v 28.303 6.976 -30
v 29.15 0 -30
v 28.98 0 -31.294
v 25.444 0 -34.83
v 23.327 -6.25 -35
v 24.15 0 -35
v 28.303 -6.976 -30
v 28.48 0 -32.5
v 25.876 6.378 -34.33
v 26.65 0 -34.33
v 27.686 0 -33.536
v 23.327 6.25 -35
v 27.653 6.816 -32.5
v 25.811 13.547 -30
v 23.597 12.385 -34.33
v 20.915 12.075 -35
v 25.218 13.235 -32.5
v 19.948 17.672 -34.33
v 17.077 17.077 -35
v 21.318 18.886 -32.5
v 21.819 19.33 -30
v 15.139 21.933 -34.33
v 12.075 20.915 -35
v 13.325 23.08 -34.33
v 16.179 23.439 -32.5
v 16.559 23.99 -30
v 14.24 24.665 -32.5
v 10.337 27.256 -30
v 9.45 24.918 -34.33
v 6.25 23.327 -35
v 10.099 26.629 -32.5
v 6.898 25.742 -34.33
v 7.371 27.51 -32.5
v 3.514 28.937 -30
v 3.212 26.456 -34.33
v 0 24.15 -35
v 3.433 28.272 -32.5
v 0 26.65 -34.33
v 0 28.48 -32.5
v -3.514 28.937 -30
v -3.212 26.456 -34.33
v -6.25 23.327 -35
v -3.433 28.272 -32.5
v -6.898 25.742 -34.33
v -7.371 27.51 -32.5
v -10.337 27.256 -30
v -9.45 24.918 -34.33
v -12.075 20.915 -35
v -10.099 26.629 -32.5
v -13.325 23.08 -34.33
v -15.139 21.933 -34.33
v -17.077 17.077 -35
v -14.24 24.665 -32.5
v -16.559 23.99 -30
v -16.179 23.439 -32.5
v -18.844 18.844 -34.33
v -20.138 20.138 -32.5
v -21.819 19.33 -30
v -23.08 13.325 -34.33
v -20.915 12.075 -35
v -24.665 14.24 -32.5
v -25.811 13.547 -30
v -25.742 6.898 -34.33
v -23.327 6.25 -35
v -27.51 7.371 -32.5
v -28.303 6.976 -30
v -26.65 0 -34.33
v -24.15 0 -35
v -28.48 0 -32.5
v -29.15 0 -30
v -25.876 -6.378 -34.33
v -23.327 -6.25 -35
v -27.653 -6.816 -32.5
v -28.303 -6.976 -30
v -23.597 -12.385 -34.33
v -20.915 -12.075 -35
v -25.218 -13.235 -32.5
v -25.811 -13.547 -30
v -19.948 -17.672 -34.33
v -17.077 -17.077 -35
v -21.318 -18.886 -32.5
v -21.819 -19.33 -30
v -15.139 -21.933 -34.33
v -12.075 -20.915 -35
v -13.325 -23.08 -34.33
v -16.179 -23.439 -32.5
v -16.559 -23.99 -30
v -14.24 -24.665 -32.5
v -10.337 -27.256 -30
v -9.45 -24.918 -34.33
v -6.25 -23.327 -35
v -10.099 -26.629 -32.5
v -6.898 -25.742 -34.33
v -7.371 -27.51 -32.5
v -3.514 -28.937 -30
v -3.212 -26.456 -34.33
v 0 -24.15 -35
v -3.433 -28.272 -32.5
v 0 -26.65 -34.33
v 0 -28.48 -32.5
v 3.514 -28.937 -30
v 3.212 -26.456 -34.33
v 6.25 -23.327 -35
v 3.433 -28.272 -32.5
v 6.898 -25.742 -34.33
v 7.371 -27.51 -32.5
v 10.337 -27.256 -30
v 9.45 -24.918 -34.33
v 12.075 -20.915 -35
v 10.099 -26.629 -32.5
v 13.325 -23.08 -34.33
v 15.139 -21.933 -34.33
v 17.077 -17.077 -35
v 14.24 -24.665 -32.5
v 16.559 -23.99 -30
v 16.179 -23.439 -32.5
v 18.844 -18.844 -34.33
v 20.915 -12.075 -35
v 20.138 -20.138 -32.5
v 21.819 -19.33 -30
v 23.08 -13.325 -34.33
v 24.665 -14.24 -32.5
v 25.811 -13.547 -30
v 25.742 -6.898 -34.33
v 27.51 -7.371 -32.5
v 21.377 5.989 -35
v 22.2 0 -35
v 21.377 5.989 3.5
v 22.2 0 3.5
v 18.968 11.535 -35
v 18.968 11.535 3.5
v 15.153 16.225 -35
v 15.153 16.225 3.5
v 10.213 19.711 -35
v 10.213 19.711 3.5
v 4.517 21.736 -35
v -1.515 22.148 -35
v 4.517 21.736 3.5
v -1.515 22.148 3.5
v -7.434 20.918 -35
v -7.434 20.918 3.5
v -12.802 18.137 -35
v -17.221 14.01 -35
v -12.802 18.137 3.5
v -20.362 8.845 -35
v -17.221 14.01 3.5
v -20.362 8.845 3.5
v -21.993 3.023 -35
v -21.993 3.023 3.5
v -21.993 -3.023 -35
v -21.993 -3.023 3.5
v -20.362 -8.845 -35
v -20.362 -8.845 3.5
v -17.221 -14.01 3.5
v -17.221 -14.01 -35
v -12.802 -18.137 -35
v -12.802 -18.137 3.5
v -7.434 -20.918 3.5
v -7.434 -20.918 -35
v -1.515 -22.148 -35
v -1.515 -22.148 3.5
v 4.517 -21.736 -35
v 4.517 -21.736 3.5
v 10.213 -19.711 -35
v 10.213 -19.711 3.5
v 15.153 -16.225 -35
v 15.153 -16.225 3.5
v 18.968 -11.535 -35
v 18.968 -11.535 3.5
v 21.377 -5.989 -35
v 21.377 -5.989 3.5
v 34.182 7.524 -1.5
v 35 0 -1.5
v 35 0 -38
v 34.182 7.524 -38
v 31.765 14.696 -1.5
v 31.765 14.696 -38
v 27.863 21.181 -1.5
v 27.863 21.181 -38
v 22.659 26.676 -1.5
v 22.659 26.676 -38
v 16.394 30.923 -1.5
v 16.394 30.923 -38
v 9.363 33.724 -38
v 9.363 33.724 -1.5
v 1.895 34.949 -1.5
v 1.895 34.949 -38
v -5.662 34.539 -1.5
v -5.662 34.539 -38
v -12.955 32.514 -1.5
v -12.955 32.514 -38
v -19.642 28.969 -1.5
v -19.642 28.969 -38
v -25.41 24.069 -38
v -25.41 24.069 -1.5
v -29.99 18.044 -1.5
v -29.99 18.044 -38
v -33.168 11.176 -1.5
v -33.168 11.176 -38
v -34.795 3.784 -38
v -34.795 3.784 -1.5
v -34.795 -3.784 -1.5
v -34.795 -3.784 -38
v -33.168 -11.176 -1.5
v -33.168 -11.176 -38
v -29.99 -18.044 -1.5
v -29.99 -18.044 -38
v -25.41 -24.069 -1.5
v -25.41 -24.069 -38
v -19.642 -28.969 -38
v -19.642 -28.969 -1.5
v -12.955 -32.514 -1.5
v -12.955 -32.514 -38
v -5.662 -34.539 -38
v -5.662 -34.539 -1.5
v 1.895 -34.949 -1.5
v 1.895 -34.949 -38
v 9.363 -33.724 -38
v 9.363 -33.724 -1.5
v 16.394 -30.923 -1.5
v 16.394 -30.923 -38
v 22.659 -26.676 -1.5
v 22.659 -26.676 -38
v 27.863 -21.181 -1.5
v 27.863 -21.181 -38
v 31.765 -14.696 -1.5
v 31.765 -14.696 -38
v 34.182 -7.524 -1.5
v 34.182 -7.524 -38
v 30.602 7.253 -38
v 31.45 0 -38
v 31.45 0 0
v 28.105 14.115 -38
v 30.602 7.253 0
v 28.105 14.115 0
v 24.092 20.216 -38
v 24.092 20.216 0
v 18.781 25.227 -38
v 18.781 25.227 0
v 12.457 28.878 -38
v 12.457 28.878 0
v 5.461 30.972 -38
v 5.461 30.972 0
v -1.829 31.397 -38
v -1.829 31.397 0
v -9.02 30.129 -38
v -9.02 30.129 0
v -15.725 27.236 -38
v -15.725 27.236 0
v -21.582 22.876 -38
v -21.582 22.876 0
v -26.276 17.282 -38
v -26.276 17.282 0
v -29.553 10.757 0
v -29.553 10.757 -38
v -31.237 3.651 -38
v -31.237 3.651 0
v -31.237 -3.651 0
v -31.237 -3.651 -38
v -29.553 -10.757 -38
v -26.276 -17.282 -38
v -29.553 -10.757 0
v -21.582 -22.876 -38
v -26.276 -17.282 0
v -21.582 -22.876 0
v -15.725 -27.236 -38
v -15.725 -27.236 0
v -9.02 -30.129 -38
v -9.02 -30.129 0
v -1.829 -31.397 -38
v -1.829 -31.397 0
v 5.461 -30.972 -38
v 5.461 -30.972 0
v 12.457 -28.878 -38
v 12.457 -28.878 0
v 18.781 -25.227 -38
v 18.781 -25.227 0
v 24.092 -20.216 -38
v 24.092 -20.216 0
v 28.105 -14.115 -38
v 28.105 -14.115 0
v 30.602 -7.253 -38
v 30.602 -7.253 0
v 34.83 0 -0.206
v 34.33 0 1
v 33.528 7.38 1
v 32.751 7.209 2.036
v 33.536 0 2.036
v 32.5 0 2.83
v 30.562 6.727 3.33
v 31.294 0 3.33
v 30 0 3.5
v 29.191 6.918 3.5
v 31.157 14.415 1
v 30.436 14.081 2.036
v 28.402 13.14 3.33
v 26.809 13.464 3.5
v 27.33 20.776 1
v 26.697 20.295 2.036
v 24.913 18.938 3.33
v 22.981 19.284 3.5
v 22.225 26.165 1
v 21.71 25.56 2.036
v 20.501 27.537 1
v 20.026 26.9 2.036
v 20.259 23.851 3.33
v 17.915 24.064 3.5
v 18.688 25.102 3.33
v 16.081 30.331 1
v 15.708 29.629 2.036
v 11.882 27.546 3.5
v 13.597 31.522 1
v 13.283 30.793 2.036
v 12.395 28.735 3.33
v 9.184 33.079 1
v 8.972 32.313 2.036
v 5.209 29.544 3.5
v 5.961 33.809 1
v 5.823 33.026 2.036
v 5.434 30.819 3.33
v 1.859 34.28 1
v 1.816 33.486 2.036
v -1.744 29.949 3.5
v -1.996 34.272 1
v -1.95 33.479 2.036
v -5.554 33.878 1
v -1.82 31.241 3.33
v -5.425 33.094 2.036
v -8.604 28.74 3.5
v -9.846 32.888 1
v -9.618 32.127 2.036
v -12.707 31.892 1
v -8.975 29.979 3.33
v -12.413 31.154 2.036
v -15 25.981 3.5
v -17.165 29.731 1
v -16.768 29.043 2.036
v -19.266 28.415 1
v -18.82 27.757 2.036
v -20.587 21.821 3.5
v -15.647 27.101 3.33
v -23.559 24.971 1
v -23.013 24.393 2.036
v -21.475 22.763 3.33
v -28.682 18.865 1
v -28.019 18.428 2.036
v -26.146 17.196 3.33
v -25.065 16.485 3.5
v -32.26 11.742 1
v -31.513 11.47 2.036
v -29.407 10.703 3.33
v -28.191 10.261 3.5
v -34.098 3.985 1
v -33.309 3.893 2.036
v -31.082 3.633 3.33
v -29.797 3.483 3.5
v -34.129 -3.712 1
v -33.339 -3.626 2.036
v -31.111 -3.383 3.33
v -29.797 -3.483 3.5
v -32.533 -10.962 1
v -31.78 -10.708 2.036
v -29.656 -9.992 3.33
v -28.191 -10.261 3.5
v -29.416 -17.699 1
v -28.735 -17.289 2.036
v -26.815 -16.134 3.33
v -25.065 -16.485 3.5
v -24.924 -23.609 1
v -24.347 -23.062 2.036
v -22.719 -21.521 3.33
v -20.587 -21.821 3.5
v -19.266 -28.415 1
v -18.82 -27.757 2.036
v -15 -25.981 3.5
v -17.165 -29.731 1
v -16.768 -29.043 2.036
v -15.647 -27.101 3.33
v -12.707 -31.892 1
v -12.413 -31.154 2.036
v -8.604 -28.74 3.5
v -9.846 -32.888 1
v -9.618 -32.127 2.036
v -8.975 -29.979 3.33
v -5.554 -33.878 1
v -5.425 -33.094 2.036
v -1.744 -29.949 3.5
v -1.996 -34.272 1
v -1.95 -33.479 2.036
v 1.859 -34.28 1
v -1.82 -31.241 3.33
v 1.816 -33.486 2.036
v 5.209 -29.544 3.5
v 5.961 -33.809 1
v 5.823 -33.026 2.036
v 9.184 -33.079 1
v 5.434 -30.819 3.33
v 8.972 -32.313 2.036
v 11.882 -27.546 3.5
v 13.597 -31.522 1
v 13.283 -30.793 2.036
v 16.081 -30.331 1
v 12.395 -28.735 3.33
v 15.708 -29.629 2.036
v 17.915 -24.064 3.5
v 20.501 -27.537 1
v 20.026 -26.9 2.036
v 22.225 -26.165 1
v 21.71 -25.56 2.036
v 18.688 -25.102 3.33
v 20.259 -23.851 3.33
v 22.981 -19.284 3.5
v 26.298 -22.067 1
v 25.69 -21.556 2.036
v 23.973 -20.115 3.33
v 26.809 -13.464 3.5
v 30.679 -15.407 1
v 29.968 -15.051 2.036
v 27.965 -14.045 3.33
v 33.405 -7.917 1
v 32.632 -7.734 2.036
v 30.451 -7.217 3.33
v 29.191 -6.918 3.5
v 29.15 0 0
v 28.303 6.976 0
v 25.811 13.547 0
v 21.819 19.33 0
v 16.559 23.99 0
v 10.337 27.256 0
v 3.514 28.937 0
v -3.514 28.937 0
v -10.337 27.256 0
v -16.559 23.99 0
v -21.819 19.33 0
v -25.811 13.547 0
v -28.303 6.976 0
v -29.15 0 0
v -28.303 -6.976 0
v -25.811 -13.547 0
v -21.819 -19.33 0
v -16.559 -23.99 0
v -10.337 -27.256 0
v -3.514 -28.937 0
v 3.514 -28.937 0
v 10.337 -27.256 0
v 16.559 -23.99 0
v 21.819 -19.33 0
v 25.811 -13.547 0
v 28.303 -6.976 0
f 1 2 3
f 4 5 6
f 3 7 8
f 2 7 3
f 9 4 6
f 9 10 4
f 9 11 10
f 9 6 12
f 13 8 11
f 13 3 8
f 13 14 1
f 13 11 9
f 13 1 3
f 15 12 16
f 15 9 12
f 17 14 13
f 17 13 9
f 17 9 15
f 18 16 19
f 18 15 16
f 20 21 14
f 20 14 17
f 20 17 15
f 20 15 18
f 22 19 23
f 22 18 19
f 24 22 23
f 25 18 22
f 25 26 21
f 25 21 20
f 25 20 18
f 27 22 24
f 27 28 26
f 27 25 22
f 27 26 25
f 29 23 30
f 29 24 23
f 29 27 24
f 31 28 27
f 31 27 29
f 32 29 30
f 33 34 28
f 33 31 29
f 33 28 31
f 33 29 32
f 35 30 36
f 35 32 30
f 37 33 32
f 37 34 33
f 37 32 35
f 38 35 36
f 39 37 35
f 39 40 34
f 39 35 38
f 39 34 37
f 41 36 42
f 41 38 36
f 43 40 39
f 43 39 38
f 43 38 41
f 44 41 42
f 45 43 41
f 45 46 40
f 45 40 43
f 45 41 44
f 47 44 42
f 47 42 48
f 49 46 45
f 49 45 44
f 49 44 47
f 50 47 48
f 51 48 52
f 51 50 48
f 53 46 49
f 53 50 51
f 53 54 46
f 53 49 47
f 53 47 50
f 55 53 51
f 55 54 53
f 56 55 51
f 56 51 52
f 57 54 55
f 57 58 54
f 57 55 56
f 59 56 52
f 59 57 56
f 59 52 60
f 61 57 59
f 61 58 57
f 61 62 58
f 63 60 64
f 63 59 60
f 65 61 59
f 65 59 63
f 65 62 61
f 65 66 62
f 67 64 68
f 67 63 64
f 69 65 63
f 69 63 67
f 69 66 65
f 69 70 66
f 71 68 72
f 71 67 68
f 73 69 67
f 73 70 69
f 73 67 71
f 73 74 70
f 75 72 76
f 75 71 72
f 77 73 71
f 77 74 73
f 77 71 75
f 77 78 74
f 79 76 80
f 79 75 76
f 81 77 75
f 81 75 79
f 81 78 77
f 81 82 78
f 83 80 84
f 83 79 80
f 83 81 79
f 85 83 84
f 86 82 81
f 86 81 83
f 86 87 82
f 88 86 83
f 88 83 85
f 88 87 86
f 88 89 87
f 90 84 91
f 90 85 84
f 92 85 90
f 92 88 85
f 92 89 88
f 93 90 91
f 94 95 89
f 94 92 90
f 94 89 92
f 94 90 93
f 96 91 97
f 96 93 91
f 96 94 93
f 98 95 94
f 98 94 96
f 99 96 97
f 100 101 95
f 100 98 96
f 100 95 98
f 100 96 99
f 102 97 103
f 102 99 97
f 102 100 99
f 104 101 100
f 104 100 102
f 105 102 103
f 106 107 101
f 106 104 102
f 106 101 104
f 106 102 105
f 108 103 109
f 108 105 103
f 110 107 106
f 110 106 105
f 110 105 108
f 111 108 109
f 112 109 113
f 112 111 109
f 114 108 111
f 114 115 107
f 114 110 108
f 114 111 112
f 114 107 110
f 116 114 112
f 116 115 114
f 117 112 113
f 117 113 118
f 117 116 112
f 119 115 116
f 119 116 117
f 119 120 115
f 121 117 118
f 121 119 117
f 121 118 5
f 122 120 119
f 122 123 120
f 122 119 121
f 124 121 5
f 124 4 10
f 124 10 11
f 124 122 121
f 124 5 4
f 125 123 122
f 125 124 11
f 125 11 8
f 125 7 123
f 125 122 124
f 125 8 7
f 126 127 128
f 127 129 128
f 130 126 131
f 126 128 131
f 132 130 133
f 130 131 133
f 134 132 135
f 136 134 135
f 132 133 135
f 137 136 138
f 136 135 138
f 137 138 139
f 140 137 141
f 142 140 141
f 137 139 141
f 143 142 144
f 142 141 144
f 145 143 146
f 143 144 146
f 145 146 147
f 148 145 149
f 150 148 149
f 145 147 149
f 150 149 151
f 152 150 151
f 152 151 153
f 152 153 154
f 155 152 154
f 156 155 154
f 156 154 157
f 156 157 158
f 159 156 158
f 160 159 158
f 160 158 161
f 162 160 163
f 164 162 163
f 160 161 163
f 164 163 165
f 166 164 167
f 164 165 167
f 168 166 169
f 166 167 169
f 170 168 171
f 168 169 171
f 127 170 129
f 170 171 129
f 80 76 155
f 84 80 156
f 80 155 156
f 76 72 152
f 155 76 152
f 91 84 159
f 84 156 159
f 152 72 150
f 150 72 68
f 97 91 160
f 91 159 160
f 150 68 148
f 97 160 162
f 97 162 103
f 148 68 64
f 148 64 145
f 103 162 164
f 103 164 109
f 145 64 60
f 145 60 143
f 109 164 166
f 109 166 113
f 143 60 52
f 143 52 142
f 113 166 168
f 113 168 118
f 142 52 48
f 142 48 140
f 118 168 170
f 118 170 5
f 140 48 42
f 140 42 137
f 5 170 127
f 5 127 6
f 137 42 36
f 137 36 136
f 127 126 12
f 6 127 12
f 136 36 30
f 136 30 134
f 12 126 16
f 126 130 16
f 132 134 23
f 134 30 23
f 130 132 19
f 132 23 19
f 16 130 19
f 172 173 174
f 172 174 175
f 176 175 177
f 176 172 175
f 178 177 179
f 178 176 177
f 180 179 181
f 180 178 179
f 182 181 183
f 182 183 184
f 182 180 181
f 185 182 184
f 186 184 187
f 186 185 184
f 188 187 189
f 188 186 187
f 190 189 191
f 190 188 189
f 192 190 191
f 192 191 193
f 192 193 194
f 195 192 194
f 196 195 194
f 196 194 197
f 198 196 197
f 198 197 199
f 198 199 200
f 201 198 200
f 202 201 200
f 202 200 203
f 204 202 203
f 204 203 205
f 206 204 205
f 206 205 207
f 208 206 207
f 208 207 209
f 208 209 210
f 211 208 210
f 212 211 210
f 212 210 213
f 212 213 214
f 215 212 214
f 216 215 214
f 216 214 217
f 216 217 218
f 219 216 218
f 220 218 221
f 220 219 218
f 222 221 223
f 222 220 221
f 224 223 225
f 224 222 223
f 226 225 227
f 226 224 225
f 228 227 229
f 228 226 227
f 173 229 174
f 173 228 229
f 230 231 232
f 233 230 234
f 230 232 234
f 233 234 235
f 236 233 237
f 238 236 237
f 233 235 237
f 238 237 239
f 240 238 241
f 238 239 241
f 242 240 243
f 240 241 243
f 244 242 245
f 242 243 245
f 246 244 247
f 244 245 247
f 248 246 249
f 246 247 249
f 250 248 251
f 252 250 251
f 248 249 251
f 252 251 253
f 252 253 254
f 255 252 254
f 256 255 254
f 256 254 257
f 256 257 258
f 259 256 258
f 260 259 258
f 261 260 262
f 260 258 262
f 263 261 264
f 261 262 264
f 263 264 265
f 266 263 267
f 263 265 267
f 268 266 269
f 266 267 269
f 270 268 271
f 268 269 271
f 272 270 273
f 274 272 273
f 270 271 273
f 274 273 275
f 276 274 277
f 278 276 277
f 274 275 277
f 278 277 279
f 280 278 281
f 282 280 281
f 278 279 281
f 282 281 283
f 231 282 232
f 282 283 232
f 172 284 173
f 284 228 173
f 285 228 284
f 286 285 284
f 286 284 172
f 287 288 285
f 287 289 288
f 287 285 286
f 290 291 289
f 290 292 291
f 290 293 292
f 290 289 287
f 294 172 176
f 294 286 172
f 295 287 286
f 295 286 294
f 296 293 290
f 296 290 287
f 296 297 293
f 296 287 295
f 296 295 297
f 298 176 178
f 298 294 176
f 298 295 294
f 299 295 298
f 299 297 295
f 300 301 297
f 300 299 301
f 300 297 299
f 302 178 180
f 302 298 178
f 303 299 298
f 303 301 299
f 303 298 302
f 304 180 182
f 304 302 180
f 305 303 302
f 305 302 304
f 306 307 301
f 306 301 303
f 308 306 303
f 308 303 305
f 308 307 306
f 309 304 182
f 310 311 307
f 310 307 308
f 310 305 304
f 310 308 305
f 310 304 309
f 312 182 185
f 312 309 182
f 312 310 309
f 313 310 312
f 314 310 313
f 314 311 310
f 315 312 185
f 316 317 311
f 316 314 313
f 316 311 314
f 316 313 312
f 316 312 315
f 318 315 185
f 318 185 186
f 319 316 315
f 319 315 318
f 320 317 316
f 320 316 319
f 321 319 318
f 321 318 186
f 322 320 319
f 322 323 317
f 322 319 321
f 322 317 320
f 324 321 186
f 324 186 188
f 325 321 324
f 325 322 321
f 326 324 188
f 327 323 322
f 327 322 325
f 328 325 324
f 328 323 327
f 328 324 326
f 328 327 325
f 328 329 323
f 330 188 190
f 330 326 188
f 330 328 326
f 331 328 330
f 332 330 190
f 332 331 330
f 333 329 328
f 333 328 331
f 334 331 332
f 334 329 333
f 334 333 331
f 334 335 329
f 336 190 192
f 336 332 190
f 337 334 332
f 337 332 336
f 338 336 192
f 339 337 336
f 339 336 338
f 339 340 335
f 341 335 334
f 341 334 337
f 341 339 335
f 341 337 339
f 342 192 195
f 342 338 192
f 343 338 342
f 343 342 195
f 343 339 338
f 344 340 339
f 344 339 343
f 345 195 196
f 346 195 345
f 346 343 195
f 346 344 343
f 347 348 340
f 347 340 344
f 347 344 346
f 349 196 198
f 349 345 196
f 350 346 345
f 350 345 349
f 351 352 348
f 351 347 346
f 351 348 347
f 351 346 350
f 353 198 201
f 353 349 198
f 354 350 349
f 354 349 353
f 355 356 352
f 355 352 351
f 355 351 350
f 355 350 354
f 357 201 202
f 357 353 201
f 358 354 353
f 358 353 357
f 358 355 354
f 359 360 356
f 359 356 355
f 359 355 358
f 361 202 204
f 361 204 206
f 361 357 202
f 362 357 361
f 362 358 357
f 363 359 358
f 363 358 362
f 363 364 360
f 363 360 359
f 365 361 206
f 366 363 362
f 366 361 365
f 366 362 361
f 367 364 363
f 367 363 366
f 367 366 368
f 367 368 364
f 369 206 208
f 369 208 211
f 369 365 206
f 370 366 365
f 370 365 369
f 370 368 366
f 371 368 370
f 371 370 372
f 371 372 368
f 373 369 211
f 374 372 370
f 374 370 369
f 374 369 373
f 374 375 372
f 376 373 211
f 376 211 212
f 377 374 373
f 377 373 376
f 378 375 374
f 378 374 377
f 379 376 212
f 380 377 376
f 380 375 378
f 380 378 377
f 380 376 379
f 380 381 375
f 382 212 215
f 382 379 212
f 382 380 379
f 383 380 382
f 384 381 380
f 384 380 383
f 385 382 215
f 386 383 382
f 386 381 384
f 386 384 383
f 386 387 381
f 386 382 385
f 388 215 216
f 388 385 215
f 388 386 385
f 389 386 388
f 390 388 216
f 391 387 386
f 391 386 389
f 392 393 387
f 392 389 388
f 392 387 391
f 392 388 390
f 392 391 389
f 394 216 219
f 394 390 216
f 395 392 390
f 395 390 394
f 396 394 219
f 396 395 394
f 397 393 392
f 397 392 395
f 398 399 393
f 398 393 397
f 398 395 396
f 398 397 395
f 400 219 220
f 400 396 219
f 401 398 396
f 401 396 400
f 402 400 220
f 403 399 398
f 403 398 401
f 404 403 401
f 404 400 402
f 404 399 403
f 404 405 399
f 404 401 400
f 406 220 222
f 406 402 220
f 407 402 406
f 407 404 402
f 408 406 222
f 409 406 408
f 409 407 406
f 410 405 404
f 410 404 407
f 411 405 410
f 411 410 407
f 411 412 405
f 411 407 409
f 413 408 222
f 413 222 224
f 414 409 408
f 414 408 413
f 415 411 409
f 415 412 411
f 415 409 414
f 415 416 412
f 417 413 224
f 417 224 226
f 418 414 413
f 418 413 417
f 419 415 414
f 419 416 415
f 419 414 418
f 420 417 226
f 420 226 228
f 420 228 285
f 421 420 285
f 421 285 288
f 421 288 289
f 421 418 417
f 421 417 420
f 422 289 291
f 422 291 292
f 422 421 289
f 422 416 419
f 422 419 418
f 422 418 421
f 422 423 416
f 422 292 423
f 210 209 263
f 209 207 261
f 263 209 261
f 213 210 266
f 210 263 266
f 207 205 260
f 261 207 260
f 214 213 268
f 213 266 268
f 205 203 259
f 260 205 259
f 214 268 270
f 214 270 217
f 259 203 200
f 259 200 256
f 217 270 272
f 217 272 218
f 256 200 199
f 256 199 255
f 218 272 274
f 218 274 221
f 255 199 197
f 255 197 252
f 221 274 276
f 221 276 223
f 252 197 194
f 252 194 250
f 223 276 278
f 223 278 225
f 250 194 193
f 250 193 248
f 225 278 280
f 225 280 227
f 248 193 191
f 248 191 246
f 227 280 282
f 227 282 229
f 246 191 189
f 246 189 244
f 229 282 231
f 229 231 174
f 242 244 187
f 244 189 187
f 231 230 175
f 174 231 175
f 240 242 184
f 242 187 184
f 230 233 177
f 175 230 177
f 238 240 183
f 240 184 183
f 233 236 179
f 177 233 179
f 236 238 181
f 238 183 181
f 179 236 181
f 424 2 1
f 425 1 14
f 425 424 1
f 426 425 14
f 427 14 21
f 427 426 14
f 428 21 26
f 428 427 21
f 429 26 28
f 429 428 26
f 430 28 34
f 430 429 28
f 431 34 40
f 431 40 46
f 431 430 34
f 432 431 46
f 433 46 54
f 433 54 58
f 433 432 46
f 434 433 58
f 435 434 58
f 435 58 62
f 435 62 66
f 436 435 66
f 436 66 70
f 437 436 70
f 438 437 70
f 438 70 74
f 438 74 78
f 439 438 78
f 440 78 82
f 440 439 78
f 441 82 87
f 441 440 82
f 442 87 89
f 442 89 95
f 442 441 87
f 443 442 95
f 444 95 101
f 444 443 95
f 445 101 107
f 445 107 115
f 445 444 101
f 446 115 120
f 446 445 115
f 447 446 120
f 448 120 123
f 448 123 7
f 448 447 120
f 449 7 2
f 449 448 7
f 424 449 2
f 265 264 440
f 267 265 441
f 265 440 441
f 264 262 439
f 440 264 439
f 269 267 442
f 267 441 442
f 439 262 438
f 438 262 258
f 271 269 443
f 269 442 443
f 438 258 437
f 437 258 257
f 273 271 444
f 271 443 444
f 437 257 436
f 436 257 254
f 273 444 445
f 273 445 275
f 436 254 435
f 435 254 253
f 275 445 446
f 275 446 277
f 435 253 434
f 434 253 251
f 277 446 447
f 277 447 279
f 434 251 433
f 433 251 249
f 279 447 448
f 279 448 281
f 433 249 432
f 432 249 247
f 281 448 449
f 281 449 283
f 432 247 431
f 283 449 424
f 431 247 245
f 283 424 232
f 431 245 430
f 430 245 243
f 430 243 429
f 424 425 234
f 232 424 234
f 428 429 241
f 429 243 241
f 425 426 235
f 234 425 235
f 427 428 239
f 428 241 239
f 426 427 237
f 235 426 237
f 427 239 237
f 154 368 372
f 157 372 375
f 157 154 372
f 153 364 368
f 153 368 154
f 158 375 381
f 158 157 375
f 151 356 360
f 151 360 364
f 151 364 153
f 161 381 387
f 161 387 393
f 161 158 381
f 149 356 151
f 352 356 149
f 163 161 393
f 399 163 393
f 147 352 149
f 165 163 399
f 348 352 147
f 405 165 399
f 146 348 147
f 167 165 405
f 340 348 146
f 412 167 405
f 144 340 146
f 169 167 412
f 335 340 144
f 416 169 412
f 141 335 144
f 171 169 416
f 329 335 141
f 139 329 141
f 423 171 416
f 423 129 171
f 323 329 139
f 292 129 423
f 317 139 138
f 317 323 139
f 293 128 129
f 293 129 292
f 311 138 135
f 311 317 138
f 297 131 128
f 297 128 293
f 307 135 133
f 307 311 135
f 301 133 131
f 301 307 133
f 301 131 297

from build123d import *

# Parameters (mm, degrees)
F0_R     = 35
F0_R_2   = 31.45
F1_DEPTH = 38
F0_R_3   = 29.15
F2_DEPTH = 3.5
F3_R     = 22.2
F4_DEPTH = 25
F5_R     = 25.5
F5_R_2   = 22.2
F6_DEPTH = 35
F7_R     = 29.15
F7_R_2   = 25.5
F8_DEPTH = 35
F9_R     = 5
F10_R    = 5


with BuildPart() as f1:
    # F0 (on Top) → F1 (new body)
    with BuildSketch(Plane.XY):
        Circle(F0_R)
        Circle(F0_R_2, mode=Mode.SUBTRACT)
    extrude(amount=-F1_DEPTH)

    # F0 (on Top) → F2 (join)
    with BuildSketch(Plane.XY):
        Circle(F0_R)
        Circle(F0_R_2, mode=Mode.SUBTRACT)
        Circle(F0_R_2)
        Circle(F0_R_3, mode=Mode.SUBTRACT)
        Circle(F0_R_3)
    extrude(amount=F2_DEPTH)

    # F3 (on face) → F4 (cut)
    with BuildSketch(Plane.XY.offset(3.5)):
        Circle(F3_R)
    extrude(amount=-F4_DEPTH, mode=Mode.SUBTRACT)

    # F5 (on face) → F6 (join)
    with BuildSketch(Plane.XY):
        Circle(F5_R)
        Circle(F5_R_2, mode=Mode.SUBTRACT)
    extrude(amount=-F6_DEPTH)

    # F7 (on face) → F8 (join, through all)
    with BuildSketch(Plane.XY):
        Circle(F7_R)
        Circle(F7_R_2, mode=Mode.SUBTRACT)
    extrude(amount=-F8_DEPTH)

    # F9
    f9_edges = [f1.edges().sort_by_distance(p)[0] for p in [
        (-35, 0, 3.5),
    ]]
    fillet(f9_edges, radius=F9_R)

    # F10
    f10_edges = [f1.edges().sort_by_distance(p)[0] for p in [
        (-29.15, 0, -35),
    ]]
    fillet(f10_edges, radius=F10_R)


solid = f1.part
